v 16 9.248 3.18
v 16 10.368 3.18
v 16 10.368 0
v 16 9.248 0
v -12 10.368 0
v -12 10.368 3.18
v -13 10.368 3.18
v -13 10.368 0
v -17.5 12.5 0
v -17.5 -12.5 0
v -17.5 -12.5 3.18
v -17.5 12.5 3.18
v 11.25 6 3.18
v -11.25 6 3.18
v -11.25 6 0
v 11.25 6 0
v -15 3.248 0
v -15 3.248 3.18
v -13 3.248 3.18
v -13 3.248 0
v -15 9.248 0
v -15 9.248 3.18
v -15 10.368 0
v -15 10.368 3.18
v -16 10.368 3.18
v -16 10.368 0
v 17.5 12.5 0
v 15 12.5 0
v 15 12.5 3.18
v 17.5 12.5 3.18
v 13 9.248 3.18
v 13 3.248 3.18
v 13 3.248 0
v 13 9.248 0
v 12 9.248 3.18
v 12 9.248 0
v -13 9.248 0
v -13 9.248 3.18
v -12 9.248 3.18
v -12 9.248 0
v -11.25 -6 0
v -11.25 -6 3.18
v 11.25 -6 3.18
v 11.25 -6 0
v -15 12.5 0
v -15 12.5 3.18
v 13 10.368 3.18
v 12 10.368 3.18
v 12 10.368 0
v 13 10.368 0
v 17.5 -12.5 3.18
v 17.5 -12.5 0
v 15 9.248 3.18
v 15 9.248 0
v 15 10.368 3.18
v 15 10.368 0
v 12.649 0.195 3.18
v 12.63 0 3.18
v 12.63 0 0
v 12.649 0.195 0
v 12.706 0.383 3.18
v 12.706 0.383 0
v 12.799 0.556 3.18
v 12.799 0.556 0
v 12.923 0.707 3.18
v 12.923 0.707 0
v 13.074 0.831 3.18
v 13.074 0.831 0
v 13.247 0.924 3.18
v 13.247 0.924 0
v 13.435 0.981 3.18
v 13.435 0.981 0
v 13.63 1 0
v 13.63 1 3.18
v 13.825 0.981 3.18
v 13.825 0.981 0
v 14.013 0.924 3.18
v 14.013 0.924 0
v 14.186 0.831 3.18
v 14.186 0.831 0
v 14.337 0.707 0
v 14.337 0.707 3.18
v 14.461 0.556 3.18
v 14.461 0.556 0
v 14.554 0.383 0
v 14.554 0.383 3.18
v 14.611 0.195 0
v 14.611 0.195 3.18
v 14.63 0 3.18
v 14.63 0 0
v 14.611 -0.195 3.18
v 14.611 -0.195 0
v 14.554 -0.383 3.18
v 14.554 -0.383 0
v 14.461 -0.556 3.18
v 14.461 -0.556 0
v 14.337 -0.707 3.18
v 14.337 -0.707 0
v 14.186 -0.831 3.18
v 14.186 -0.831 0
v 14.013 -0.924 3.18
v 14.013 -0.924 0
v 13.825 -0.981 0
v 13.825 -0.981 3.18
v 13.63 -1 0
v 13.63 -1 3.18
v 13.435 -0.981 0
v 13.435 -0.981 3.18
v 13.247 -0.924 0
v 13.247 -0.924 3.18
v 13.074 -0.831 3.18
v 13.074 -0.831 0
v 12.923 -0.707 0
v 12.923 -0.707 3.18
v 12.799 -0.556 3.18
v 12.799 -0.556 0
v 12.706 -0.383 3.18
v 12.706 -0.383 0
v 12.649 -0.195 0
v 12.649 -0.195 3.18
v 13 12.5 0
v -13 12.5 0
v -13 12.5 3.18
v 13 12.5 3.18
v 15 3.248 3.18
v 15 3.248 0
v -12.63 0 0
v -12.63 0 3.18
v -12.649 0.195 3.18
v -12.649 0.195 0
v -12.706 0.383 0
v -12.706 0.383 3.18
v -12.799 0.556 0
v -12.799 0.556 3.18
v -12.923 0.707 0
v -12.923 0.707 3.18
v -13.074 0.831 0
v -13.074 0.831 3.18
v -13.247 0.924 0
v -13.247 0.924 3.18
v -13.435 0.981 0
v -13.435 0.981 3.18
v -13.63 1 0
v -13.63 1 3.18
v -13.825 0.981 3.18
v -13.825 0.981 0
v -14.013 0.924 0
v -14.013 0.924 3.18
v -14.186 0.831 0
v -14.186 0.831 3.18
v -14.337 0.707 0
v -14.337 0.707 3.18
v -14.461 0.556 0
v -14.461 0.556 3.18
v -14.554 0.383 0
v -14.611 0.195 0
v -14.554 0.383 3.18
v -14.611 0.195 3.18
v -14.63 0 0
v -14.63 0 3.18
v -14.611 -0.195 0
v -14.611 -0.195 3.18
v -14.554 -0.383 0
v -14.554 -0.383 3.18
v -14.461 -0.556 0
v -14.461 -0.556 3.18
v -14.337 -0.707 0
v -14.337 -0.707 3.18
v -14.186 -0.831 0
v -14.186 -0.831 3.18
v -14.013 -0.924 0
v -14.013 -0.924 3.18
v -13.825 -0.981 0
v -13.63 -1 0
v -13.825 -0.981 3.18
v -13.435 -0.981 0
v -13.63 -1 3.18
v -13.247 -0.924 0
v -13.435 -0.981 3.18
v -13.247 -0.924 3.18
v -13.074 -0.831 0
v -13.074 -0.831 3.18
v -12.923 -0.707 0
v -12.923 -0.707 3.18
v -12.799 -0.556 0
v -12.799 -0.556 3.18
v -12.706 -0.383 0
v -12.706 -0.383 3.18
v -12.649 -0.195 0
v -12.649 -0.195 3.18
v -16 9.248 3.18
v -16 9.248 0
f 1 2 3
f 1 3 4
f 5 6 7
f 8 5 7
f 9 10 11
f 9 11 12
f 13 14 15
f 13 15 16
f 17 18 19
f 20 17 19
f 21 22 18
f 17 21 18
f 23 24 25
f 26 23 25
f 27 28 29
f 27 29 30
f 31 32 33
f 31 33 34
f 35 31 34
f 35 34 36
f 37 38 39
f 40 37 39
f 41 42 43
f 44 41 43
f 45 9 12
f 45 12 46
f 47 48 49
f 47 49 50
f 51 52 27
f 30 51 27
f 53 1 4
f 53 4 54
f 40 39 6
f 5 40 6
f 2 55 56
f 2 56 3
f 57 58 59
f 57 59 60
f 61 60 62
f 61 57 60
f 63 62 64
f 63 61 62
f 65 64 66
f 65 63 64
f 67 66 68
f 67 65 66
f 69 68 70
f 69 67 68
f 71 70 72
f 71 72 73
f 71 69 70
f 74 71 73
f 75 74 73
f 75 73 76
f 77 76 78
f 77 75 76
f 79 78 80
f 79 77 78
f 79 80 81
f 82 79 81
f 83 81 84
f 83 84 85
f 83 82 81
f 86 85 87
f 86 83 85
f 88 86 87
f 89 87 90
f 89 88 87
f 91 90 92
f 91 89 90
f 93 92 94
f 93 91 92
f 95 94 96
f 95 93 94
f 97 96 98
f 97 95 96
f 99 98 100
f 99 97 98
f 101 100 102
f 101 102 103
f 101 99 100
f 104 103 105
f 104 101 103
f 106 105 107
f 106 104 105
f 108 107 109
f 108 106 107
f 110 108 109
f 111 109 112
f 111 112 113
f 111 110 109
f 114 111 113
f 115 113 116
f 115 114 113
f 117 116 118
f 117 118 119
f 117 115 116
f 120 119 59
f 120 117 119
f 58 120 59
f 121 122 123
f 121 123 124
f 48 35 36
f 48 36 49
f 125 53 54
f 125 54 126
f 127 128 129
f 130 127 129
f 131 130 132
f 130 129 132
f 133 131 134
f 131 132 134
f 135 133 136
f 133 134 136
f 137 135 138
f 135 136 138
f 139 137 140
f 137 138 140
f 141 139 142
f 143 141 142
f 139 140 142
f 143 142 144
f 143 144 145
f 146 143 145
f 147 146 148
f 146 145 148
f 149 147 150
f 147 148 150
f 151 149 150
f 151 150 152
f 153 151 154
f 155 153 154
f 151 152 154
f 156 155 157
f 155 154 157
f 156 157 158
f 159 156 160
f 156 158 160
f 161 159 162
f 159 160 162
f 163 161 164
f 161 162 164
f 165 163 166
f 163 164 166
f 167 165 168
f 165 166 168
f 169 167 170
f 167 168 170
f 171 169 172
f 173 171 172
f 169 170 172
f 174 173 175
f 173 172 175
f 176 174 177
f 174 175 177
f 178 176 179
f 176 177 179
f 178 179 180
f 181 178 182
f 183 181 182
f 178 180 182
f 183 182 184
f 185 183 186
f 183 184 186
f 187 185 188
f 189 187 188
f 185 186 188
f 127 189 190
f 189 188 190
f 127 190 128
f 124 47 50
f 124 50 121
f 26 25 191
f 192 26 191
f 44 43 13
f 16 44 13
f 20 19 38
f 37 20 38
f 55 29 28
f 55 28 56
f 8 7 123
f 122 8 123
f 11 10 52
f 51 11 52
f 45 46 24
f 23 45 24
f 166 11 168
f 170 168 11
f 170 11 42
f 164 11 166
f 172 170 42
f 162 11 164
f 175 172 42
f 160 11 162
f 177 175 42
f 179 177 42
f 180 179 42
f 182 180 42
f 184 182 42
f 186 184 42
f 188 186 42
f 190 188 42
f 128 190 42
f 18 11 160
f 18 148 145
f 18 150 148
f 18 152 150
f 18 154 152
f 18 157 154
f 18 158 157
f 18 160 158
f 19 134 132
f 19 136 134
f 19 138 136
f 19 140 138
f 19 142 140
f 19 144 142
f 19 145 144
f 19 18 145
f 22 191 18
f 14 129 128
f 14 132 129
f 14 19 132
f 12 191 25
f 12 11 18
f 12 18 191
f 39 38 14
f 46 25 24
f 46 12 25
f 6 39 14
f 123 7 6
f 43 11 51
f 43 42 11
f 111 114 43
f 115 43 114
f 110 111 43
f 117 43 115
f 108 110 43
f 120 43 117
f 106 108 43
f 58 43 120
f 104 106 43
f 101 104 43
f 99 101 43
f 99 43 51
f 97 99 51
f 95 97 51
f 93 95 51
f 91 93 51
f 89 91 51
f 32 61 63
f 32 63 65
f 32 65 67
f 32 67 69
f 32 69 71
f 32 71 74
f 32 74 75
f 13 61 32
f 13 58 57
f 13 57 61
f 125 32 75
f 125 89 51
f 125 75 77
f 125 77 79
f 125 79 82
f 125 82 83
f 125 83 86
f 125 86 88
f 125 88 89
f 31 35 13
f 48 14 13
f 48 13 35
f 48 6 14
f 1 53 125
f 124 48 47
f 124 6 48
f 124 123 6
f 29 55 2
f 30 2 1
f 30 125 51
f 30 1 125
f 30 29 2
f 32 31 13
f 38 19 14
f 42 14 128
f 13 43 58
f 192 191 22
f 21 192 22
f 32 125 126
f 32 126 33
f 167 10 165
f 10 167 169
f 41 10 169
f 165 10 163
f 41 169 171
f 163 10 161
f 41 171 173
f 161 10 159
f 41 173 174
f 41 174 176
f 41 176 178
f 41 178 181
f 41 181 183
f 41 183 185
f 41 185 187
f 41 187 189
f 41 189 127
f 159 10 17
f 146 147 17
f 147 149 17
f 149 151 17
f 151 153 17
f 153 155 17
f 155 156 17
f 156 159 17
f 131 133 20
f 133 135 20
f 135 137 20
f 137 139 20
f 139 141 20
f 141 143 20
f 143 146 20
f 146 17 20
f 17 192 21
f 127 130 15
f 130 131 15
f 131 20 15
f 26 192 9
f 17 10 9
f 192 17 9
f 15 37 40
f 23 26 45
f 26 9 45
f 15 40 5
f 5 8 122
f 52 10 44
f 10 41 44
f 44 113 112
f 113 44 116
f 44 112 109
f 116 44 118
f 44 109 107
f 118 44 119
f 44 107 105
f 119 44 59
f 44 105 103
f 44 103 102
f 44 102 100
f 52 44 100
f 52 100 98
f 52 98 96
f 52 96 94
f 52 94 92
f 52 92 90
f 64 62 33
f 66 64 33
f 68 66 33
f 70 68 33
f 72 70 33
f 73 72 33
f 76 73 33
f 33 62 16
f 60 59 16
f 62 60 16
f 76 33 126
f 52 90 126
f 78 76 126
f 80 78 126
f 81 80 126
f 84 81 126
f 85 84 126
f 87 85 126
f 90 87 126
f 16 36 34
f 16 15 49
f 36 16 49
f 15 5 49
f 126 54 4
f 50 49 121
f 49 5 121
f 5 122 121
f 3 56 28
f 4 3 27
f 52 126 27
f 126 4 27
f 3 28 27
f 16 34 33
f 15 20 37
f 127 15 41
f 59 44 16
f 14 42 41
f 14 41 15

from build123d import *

# Parameters (mm, degrees)
SKETCH1_W           = 35
SKETCH1_H           = 25
BOSS_EXTRUDE1_DEPTH = 3.18
SKETCH2_W           = 22.5
SKETCH2_H           = 12
CUT_EXTRUDE1_DEPTH  = 3.18
SKETCH3_R           = 1
CUT_EXTRUDE2_DEPTH  = 3.18
CUT_EXTRUDE4_DEPTH  = 3.18


with BuildPart() as part:
    # Sketch1 → Boss-Extrude1 (new body)
    with BuildSketch(Plane.XY):
        Rectangle(SKETCH1_W, SKETCH1_H)
    extrude(amount=BOSS_EXTRUDE1_DEPTH)

    # Sketch2 → Cut-Extrude1 (cut)
    with BuildSketch(Plane.XY.offset(3.18)):
        Rectangle(SKETCH2_W, SKETCH2_H)
    extrude(amount=-CUT_EXTRUDE1_DEPTH, mode=Mode.SUBTRACT)

    # Sketch3 → Cut-Extrude2 (cut)
    with BuildSketch(Plane.XY.offset(3.18)):
        with Locations((-13.63, 0)):
            Circle(SKETCH3_R)
    cut_extrude2 = extrude(amount=-CUT_EXTRUDE2_DEPTH, mode=Mode.SUBTRACT)

    # Mirror1: Cut-Extrude2 across plane
    add(cut_extrude2.mirror(Plane(origin=(0, 0, 0), x_dir=(0, 0, 1), z_dir=(1, 0, 0))), mode=Mode.SUBTRACT)

    # Sketch5 → Cut-Extrude4 (cut)
    with BuildSketch(Plane.XY.offset(3.18)):
        Polygon((-13, 12.5), (-15, 12.5), (-15, 10.368), (-16, 10.368), (-16, 9.248), (-15, 9.248), (-15, 3.248), (-13, 3.248), (-13, 9.248), (-12, 9.248), (-12, 10.368), (-13, 10.368), align=None)
    cut_extrude4 = extrude(amount=-CUT_EXTRUDE4_DEPTH, mode=Mode.SUBTRACT)

    # Mirror2: Cut-Extrude4 across plane
    add(cut_extrude4.mirror(Plane(origin=(0, 0, 0), x_dir=(0, 0, 1), z_dir=(1, 0, 0))), mode=Mode.SUBTRACT)


solid = part.part
